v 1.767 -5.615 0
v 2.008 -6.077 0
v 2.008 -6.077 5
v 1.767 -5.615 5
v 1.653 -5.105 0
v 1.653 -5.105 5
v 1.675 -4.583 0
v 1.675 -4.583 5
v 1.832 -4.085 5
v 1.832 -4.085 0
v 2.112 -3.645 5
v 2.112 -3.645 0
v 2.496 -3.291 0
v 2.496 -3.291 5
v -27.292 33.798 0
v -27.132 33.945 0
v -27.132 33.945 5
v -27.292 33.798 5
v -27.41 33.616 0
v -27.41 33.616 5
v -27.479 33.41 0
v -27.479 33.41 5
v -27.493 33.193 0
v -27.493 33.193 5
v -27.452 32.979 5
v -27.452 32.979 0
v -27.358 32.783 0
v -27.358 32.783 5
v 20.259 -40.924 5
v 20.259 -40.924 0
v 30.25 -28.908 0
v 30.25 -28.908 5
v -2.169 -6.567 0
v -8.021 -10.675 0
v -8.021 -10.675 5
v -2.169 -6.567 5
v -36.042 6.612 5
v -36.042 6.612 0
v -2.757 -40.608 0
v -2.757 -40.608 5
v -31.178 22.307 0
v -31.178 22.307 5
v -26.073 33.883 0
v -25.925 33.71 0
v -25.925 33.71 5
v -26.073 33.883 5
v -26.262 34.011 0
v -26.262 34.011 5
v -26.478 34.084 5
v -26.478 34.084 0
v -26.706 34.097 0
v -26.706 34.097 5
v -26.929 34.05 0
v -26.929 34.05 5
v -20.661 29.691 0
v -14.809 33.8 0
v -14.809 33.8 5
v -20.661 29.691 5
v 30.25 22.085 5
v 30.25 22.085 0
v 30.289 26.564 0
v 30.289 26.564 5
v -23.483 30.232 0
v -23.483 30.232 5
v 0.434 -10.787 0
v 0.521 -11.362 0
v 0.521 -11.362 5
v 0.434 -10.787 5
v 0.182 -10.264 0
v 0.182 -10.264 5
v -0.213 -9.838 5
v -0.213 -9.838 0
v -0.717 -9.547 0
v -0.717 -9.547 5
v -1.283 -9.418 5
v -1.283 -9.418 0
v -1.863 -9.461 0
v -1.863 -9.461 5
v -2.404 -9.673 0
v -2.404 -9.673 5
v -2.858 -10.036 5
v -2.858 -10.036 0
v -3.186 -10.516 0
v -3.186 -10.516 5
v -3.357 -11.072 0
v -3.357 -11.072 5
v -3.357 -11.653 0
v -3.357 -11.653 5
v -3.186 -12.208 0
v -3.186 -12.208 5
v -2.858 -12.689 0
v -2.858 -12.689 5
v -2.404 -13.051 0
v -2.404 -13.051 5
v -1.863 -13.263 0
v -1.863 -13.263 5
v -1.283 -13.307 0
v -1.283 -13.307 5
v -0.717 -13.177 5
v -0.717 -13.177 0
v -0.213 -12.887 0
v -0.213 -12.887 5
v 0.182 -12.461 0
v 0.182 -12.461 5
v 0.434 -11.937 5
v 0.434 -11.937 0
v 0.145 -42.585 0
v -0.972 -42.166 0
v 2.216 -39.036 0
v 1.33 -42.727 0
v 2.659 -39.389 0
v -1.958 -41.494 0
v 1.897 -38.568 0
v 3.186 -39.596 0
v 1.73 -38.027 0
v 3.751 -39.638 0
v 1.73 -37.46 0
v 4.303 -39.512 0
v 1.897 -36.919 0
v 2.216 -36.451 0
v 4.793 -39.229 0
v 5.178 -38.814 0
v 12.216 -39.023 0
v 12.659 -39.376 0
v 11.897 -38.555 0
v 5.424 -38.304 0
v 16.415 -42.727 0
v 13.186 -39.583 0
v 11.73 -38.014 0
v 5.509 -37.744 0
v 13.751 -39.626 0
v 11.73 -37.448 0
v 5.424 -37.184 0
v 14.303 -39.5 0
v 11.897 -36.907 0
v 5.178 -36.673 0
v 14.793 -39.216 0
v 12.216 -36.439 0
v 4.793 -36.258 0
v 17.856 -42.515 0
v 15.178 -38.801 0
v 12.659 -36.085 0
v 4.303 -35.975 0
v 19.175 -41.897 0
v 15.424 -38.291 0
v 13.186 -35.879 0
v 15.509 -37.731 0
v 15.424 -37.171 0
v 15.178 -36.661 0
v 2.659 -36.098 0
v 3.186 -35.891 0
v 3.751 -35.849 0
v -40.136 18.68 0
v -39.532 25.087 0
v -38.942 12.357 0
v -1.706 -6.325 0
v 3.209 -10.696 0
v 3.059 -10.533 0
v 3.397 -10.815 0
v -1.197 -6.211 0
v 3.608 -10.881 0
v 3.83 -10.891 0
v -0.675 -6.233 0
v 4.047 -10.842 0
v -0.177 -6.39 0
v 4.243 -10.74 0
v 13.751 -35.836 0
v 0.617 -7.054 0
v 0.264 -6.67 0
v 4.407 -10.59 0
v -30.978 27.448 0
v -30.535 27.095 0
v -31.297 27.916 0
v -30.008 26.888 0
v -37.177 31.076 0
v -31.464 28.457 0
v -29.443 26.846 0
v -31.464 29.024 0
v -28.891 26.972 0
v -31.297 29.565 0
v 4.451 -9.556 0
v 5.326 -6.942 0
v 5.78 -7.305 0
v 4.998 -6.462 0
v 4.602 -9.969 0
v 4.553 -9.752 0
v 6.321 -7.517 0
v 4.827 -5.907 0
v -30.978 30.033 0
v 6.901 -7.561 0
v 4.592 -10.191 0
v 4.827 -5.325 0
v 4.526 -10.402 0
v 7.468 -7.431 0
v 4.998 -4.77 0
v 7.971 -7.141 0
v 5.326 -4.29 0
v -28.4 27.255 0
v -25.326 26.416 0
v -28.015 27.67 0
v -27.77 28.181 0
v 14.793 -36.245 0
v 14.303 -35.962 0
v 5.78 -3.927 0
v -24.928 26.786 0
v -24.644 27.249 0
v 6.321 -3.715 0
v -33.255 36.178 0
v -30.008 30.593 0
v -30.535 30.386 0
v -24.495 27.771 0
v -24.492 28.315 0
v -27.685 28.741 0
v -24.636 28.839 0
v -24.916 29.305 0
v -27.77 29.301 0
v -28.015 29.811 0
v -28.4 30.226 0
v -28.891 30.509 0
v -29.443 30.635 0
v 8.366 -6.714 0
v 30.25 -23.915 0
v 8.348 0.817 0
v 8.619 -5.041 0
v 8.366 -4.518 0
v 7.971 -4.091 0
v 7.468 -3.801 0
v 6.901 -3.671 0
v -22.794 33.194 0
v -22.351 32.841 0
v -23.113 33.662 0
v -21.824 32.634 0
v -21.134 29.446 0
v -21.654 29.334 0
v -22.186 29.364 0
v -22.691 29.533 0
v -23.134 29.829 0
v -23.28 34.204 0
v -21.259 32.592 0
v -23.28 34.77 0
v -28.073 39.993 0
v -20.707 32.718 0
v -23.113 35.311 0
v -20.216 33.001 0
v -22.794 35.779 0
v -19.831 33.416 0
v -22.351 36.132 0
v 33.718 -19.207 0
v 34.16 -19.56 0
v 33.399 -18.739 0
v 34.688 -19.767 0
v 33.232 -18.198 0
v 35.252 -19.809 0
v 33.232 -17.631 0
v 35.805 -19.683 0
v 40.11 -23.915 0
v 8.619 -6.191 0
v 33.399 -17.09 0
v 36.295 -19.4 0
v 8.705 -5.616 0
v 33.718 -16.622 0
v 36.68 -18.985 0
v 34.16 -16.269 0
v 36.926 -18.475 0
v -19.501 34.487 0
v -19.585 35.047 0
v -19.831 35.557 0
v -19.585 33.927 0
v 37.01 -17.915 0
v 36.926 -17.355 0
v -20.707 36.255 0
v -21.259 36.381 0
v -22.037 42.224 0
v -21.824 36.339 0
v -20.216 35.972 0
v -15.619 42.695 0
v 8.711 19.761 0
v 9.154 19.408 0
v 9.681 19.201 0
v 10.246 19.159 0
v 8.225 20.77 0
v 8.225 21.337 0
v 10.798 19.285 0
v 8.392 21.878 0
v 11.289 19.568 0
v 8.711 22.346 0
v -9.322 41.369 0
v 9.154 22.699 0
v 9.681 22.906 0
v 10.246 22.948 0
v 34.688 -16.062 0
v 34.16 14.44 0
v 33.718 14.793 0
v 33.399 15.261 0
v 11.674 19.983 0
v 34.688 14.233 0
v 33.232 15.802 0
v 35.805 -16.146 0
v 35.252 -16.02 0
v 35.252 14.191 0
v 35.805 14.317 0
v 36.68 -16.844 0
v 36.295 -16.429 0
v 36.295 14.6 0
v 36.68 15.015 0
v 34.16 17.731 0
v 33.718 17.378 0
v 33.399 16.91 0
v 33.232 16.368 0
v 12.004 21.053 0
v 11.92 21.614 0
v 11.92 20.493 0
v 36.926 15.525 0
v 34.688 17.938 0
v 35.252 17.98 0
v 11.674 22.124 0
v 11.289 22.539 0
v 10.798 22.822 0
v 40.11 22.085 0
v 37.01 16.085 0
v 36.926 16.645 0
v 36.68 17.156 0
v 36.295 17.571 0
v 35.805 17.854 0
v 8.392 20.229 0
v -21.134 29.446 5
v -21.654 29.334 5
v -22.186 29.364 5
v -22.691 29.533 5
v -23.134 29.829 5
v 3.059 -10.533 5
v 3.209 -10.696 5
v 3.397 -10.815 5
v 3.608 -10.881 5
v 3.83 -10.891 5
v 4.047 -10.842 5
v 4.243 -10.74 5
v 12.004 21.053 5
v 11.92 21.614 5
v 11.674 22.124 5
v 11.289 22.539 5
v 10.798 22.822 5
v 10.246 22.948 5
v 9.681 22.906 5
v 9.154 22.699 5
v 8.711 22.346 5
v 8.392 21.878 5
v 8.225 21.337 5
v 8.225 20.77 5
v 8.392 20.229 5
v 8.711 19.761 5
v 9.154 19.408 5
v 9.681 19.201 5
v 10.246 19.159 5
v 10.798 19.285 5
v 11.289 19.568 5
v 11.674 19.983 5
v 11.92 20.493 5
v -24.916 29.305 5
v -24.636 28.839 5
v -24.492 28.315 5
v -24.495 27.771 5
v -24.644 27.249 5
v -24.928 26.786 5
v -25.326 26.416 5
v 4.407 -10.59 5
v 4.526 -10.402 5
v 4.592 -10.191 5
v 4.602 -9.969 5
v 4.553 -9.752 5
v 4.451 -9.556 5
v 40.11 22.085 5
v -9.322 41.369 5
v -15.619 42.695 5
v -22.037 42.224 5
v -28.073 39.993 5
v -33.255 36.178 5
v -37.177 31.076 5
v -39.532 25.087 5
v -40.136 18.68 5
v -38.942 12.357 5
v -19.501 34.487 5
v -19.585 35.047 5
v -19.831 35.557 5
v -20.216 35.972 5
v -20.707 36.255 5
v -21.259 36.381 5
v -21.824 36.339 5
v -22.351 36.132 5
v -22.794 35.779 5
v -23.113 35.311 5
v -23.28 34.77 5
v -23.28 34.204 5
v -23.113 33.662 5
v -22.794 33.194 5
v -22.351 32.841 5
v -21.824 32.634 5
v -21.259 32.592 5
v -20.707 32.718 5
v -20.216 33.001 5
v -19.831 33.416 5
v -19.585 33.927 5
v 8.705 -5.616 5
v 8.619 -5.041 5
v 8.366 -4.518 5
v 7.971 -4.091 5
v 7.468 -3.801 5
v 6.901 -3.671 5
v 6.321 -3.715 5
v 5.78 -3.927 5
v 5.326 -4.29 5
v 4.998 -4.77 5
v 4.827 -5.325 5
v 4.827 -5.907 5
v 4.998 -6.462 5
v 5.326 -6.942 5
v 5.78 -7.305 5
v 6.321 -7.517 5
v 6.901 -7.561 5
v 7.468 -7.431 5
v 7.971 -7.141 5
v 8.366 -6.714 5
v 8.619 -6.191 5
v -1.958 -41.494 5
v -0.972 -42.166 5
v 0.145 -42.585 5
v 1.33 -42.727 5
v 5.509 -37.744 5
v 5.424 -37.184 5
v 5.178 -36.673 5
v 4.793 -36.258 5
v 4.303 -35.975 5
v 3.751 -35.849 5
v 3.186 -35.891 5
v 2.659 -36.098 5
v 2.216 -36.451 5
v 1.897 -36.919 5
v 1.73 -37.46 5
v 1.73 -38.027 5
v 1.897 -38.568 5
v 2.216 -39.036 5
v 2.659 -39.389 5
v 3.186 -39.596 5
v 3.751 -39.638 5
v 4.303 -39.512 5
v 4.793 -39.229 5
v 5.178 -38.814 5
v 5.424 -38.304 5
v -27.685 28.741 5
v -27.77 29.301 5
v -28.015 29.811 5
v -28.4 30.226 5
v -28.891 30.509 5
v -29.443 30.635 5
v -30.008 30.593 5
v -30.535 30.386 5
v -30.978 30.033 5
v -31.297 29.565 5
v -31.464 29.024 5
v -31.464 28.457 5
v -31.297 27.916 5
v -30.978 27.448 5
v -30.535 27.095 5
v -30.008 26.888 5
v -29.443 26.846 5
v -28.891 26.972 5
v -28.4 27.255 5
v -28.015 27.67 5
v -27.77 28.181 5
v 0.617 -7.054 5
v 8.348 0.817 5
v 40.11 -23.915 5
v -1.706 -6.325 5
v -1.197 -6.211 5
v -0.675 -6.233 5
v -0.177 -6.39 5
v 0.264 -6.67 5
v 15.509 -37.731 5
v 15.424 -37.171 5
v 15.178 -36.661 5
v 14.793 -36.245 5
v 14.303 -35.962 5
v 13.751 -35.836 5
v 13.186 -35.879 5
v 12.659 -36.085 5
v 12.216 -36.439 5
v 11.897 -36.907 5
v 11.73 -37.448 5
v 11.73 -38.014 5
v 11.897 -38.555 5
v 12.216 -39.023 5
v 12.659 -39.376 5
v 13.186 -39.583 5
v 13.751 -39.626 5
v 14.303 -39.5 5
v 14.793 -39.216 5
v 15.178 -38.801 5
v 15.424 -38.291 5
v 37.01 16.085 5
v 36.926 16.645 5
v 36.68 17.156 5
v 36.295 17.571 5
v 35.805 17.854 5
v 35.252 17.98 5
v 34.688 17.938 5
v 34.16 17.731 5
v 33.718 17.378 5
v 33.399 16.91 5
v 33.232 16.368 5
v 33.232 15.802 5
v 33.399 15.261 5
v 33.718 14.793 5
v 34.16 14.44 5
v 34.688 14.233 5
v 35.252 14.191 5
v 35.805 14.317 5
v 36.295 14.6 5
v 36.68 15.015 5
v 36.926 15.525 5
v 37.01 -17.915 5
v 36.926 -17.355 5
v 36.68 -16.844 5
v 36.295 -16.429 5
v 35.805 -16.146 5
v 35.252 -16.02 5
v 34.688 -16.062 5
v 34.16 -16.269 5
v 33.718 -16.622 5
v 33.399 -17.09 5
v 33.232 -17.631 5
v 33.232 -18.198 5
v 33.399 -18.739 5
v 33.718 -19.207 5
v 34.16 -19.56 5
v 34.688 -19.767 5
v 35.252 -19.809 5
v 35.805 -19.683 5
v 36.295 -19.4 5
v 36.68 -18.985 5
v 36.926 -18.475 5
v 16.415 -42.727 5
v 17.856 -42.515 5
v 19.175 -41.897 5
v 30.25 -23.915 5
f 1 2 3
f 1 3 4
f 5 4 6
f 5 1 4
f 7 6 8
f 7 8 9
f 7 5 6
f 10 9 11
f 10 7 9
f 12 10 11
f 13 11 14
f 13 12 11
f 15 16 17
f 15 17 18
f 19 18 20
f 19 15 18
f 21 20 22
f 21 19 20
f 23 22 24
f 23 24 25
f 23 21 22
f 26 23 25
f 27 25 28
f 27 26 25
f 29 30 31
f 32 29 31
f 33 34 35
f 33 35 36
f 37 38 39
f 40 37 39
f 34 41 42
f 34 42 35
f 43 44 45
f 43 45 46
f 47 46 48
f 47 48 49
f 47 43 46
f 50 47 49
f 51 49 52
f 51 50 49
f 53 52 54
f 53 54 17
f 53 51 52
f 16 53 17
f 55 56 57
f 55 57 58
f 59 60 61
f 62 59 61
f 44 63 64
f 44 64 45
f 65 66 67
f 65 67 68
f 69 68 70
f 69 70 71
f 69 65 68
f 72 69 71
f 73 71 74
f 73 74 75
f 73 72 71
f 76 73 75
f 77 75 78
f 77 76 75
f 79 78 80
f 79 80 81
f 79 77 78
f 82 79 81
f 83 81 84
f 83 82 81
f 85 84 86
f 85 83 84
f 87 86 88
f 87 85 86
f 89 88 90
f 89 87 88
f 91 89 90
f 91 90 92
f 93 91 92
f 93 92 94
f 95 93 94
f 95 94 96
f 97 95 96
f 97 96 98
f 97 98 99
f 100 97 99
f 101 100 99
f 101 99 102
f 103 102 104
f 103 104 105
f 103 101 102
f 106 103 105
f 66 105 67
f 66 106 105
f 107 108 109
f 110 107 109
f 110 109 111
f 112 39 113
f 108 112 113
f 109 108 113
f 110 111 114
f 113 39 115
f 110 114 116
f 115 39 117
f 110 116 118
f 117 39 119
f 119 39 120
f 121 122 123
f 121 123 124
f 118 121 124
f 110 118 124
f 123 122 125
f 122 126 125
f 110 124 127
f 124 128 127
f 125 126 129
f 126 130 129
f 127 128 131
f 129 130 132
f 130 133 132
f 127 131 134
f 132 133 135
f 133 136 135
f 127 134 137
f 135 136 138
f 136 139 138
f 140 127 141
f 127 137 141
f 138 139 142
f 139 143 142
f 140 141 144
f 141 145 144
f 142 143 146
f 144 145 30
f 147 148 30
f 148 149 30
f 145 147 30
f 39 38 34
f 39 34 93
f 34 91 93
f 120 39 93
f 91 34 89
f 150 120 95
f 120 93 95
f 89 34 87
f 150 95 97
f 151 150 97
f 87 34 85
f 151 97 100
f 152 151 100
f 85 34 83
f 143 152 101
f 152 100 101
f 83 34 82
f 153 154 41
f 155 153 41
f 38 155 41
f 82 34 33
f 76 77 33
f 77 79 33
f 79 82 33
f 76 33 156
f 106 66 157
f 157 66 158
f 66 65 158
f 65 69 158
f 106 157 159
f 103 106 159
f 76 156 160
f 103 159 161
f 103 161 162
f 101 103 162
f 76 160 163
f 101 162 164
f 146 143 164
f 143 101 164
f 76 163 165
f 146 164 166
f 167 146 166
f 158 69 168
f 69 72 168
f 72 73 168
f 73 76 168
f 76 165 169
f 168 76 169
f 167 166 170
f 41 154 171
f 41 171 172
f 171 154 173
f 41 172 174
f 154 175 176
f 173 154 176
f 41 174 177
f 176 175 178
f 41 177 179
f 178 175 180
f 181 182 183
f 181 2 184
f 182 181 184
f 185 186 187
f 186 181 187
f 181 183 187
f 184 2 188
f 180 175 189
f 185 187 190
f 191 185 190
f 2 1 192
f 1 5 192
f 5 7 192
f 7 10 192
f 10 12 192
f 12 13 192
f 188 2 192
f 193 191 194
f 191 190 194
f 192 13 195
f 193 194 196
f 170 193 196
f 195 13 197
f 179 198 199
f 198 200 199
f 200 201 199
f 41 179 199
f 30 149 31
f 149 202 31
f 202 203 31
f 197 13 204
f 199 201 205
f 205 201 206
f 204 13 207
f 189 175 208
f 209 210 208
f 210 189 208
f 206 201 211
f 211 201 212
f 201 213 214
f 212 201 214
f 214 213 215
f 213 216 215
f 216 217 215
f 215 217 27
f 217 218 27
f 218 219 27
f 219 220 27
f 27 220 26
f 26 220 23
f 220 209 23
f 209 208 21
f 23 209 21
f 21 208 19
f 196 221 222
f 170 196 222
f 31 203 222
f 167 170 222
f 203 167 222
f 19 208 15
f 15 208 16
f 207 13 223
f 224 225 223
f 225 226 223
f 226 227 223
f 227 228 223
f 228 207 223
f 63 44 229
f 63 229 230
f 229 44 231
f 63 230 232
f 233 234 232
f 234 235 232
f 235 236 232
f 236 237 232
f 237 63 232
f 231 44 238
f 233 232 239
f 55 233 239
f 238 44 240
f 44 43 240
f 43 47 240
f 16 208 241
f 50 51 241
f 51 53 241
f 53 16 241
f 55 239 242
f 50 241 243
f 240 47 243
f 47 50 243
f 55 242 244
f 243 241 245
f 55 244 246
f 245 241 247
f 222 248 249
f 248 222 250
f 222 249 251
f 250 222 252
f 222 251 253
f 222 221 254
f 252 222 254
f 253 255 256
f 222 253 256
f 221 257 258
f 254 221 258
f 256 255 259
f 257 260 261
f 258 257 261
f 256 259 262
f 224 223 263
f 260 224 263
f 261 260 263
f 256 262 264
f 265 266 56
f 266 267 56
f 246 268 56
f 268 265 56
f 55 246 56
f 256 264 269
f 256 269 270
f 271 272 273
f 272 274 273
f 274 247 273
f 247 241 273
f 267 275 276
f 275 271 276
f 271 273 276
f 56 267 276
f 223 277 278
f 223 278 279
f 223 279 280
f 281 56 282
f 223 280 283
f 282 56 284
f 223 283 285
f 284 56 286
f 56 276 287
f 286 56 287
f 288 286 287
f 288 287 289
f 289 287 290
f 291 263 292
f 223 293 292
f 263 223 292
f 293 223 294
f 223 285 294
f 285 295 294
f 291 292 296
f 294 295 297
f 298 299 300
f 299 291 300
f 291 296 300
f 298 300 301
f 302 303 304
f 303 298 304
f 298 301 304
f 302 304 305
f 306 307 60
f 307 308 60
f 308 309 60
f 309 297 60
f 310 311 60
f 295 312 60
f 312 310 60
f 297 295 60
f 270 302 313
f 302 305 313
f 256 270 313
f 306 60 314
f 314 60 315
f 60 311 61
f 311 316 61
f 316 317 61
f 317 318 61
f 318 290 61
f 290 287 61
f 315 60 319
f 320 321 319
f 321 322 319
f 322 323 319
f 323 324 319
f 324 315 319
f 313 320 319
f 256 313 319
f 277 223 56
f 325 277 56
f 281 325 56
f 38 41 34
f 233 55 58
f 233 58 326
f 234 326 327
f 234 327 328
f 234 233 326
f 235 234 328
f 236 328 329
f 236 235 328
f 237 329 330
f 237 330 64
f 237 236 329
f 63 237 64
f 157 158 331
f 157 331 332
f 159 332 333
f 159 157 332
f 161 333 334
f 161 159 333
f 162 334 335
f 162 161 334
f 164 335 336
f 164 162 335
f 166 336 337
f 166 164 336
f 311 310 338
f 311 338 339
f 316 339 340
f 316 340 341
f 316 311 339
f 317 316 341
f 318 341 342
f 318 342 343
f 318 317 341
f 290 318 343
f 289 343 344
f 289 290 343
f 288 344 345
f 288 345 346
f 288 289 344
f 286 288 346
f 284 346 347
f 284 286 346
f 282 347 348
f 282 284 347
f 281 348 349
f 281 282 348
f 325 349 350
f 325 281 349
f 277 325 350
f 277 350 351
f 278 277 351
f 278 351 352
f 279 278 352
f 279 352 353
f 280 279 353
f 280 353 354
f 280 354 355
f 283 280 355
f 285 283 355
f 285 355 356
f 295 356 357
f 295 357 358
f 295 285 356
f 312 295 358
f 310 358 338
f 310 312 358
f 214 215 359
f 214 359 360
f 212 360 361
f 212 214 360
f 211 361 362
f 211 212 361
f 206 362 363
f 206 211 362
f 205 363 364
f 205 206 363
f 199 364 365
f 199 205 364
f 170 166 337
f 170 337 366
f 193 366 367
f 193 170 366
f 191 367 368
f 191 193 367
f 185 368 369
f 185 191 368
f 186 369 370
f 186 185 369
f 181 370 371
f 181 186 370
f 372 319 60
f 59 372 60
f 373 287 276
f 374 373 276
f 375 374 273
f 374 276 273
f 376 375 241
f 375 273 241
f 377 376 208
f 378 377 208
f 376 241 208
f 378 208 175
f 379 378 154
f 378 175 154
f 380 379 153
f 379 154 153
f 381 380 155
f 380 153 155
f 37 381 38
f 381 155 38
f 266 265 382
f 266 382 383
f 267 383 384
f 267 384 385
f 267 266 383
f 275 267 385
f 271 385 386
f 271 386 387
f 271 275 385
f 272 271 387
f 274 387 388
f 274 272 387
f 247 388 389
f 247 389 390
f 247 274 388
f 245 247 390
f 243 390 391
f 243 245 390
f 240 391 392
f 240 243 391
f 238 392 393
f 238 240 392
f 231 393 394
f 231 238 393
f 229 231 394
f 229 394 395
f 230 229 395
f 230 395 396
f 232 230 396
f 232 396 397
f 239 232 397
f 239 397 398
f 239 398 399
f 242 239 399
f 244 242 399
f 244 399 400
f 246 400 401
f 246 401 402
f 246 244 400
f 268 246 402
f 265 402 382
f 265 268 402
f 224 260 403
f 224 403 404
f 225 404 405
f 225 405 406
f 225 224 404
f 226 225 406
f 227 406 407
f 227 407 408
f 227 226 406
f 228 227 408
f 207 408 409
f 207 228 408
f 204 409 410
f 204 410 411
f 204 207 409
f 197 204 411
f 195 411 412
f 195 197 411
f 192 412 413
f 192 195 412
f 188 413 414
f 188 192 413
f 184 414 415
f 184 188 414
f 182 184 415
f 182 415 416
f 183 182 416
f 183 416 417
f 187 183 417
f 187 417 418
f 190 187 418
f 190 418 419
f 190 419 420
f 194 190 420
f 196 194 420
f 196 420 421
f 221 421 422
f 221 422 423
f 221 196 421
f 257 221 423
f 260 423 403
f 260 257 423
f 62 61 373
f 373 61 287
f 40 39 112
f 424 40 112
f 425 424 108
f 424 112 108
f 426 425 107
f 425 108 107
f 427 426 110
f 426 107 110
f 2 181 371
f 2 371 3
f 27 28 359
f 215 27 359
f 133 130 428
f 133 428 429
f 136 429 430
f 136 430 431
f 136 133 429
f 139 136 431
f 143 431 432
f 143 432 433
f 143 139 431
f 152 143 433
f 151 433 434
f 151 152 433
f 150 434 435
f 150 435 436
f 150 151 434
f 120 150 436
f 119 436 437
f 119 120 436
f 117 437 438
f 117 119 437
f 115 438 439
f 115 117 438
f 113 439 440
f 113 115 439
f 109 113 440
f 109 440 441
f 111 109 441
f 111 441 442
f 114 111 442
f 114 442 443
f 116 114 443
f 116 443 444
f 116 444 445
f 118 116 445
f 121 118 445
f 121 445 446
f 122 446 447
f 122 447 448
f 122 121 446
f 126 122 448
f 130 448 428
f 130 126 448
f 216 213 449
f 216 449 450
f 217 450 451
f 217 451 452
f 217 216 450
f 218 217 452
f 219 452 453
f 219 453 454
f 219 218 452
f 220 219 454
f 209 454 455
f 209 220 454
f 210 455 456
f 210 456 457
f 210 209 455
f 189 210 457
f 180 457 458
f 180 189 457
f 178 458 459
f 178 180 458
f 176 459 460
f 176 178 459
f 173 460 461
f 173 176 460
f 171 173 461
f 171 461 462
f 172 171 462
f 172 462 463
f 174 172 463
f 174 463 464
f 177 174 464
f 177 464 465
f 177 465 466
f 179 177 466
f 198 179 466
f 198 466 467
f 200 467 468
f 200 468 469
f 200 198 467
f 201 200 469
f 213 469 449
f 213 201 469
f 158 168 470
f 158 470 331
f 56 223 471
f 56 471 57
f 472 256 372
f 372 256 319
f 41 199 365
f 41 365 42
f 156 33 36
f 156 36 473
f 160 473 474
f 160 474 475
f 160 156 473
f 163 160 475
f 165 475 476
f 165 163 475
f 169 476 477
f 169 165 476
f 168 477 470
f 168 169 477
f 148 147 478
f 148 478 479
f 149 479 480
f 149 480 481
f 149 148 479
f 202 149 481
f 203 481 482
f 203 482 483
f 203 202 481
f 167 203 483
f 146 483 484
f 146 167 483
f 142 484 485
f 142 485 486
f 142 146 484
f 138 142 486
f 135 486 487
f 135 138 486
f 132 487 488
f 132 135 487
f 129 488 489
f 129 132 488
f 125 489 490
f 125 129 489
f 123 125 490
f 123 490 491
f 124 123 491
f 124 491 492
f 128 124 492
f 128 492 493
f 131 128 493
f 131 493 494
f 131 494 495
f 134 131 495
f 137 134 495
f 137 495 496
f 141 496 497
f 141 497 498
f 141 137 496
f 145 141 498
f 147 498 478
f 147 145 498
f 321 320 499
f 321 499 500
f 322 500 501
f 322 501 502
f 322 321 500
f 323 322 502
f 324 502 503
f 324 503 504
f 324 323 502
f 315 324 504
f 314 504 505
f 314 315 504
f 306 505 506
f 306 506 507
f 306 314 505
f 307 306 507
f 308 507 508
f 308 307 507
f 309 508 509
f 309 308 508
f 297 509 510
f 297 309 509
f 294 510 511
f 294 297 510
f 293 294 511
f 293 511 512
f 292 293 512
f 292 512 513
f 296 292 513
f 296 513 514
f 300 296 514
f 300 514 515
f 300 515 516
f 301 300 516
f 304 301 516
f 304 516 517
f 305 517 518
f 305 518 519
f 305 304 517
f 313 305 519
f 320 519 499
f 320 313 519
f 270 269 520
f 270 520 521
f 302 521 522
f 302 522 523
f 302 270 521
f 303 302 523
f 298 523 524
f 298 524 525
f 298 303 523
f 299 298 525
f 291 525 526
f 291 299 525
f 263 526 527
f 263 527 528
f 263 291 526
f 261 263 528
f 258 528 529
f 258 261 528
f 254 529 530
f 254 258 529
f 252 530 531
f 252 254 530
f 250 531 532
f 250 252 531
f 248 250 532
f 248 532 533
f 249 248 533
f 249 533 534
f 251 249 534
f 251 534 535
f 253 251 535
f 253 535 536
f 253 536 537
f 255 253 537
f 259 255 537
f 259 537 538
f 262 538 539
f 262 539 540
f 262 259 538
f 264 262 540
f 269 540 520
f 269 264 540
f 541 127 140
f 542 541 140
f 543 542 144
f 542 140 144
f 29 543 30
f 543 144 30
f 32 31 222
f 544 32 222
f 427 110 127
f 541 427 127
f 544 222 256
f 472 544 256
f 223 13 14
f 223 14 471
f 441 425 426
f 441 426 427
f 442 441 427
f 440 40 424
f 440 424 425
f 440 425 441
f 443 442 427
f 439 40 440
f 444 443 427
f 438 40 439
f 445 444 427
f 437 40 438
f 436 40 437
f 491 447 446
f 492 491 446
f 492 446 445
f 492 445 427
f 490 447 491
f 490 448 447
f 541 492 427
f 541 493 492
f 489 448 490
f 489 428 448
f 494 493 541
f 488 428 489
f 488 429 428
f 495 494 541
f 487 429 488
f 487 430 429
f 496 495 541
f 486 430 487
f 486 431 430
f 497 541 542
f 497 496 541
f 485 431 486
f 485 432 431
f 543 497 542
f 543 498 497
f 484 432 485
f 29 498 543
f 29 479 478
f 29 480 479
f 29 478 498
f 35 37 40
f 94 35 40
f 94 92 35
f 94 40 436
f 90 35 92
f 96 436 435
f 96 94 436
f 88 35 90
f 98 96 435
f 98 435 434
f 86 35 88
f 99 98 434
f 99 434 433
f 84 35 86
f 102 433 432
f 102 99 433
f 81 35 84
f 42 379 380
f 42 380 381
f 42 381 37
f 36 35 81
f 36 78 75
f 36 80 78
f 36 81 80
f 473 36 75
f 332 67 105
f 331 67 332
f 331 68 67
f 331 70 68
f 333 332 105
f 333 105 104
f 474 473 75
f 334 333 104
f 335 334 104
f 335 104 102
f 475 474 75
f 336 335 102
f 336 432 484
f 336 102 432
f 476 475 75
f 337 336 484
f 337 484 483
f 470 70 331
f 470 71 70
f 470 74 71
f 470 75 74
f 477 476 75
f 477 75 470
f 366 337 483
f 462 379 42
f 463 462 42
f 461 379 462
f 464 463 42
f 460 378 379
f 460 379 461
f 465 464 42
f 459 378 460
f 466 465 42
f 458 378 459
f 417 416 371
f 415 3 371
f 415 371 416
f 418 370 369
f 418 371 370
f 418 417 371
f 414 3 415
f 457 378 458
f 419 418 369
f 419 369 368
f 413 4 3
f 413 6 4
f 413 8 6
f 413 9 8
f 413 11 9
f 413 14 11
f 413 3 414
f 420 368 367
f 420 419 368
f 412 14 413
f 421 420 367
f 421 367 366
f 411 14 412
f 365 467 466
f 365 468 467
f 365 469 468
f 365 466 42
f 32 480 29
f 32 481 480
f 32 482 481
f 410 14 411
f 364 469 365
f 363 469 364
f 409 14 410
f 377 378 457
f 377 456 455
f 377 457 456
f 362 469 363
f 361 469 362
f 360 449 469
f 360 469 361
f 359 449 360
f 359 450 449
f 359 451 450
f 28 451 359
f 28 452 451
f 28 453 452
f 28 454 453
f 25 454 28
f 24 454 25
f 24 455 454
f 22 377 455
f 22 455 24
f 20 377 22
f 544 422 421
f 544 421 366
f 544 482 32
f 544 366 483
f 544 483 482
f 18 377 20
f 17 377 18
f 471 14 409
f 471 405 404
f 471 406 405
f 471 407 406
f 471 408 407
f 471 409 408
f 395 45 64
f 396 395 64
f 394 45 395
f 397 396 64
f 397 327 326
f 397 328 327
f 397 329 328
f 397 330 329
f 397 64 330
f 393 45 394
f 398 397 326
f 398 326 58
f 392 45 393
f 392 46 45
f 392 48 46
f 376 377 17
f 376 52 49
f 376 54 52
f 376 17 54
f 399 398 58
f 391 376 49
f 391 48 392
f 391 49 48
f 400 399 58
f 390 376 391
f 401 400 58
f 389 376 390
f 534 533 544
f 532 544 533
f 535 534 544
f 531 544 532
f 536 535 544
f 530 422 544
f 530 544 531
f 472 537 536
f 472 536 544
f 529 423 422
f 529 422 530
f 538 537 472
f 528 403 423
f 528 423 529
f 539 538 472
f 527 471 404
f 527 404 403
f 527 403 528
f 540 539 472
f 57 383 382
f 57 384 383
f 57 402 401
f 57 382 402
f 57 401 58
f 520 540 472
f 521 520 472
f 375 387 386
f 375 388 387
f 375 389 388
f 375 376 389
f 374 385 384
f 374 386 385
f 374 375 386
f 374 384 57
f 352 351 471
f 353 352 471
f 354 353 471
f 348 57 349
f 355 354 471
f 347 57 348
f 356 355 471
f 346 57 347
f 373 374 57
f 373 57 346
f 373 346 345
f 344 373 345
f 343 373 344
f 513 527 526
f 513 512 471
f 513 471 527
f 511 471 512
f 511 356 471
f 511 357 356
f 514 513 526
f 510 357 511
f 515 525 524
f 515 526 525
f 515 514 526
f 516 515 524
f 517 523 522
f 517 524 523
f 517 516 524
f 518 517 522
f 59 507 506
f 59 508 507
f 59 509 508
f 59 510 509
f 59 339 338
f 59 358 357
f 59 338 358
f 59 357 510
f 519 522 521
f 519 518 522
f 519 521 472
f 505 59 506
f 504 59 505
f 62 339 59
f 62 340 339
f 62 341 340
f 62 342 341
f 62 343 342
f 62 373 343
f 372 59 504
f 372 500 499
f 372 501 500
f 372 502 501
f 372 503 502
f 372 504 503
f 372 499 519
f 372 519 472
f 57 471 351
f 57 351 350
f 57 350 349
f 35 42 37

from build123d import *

# Parameters (mm, degrees)
ESQUISSE1_R        = 1.9
ESQUISSE1_R_2      = 1.950000027
BOSS_EXTRU_1_DEPTH = 5


with BuildPart() as part:
    # Esquisse1 → Boss.-Extru.1 (new body)
    with BuildSketch(Plane.XY):
        with BuildLine():
            Line((-36.042079519, 6.612329971), (-2.756888739, -40.60806749))
            ThreePointArc((-2.756888739, -40.60806749), (-0.971927818, -42.166026475), (1.329860158, -42.727358644))
            Line((1.329860158, -42.727358644), (16.414744778, -42.727358644))
            ThreePointArc((16.414744778, -42.727358644), (18.537962215, -42.254161899), (20.25929982, -40.92413773))
            Line((20.25929982, -40.92413773), (30.250474641, -28.908411747))
            Line((30.250474641, -28.908411747), (30.250474641, -23.914585762))
            Line((30.250474641, -23.914585762), (40.110474641, -23.914585762))
            Line((40.110474641, -23.914585762), (40.110474641, 22.085414238))
            Line((40.110474641, 22.085414238), (30.250474641, 22.085414238))
            Line((30.250474641, 22.085414238), (30.289127967, 26.563728114))
            Line((30.289127967, 26.563728114), (-9.322024272, 41.369413347))
            ThreePointArc((-9.322024272, 41.369413347), (-35.395503084, 33.764537489), (-36.042079519, 6.612329971))
        make_face()
        with Locations((-29.585096552, 28.740581162)):
            Circle(ESQUISSE1_R, mode=Mode.SUBTRACT)
        with Locations((-21.4008614, 34.486736198)):
            Circle(ESQUISSE1_R, mode=Mode.SUBTRACT)
        with Locations((-1.428936876, -11.362171084)):
            Circle(ESQUISSE1_R_2, mode=Mode.SUBTRACT)
        with Locations((6.755298276, -5.616016048)):
            Circle(ESQUISSE1_R_2, mode=Mode.SUBTRACT)
        with Locations((10.104149324, 21.053484932)):
            Circle(ESQUISSE1_R, mode=Mode.SUBTRACT)
        with Locations((3.608581782, -37.743606202)):
            Circle(ESQUISSE1_R, mode=Mode.SUBTRACT)
        with Locations((13.608573866, -37.73091599)):
            Circle(ESQUISSE1_R, mode=Mode.SUBTRACT)
        with Locations((35.110474641, -17.914585762)):
            Circle(ESQUISSE1_R, mode=Mode.SUBTRACT)
        with Locations((35.110474641, 16.085214419)):
            Circle(ESQUISSE1_R, mode=Mode.SUBTRACT)
        with BuildLine():
            Line((-14.809164556, 33.799672662), (-20.660891689, 29.691172522))
            ThreePointArc((-20.660891689, 29.691172522), (-22.18628804, 29.363713126), (-23.482781796, 30.231565432))
            Line((-23.482781796, 30.231565432), (-25.924897053, 33.709865414))
            ThreePointArc((-25.924897053, 33.709865414), (-26.47826462, 34.0839702), (-27.131559209, 33.944771651))
            ThreePointArc((-27.131559209, 33.944771651), (-27.478774003, 33.409530528), (-27.357701898, 32.783125931))
            Line((-27.357701898, 32.783125931), (-24.915585604, 29.304825893))
            ThreePointArc((-24.915585604, 29.304825893), (-24.495010021, 27.771470128), (-25.32590655, 26.415861527))
            Line((-25.32590655, 26.415861527), (-31.177633683, 22.307361387))
            Line((-31.177633683, 22.307361387), (-8.020629273, -10.675105791))
            Line((-8.020629273, -10.675105791), (-2.16890246, -6.566605875))
            ThreePointArc((-2.16890246, -6.566605875), (-0.674874752, -6.233398064), (0.617175813, -7.054221782))
            Line((0.617175813, -7.054221782), (3.05929141, -10.532521451))
            ThreePointArc((3.05929141, -10.532521451), (3.608413847, -10.881372123), (4.243376724, -10.739758611))
            ThreePointArc((4.243376724, -10.739758611), (4.592227421, -10.190636157), (4.450613892, -9.555673255))
            Line((4.450613892, -9.555673255), (2.008497767, -6.077373005))
            ThreePointArc((2.008497767, -6.077373005), (1.675290093, -4.583345549), (2.496113536, -3.291295137))
            Line((2.496113536, -3.291295137), (8.347839718, 0.817205678))
            Line((8.347839718, 0.817205678), (-14.809164556, 33.799672662))
        make_face(mode=Mode.SUBTRACT)
    extrude(amount=BOSS_EXTRU_1_DEPTH)


solid = part.part
